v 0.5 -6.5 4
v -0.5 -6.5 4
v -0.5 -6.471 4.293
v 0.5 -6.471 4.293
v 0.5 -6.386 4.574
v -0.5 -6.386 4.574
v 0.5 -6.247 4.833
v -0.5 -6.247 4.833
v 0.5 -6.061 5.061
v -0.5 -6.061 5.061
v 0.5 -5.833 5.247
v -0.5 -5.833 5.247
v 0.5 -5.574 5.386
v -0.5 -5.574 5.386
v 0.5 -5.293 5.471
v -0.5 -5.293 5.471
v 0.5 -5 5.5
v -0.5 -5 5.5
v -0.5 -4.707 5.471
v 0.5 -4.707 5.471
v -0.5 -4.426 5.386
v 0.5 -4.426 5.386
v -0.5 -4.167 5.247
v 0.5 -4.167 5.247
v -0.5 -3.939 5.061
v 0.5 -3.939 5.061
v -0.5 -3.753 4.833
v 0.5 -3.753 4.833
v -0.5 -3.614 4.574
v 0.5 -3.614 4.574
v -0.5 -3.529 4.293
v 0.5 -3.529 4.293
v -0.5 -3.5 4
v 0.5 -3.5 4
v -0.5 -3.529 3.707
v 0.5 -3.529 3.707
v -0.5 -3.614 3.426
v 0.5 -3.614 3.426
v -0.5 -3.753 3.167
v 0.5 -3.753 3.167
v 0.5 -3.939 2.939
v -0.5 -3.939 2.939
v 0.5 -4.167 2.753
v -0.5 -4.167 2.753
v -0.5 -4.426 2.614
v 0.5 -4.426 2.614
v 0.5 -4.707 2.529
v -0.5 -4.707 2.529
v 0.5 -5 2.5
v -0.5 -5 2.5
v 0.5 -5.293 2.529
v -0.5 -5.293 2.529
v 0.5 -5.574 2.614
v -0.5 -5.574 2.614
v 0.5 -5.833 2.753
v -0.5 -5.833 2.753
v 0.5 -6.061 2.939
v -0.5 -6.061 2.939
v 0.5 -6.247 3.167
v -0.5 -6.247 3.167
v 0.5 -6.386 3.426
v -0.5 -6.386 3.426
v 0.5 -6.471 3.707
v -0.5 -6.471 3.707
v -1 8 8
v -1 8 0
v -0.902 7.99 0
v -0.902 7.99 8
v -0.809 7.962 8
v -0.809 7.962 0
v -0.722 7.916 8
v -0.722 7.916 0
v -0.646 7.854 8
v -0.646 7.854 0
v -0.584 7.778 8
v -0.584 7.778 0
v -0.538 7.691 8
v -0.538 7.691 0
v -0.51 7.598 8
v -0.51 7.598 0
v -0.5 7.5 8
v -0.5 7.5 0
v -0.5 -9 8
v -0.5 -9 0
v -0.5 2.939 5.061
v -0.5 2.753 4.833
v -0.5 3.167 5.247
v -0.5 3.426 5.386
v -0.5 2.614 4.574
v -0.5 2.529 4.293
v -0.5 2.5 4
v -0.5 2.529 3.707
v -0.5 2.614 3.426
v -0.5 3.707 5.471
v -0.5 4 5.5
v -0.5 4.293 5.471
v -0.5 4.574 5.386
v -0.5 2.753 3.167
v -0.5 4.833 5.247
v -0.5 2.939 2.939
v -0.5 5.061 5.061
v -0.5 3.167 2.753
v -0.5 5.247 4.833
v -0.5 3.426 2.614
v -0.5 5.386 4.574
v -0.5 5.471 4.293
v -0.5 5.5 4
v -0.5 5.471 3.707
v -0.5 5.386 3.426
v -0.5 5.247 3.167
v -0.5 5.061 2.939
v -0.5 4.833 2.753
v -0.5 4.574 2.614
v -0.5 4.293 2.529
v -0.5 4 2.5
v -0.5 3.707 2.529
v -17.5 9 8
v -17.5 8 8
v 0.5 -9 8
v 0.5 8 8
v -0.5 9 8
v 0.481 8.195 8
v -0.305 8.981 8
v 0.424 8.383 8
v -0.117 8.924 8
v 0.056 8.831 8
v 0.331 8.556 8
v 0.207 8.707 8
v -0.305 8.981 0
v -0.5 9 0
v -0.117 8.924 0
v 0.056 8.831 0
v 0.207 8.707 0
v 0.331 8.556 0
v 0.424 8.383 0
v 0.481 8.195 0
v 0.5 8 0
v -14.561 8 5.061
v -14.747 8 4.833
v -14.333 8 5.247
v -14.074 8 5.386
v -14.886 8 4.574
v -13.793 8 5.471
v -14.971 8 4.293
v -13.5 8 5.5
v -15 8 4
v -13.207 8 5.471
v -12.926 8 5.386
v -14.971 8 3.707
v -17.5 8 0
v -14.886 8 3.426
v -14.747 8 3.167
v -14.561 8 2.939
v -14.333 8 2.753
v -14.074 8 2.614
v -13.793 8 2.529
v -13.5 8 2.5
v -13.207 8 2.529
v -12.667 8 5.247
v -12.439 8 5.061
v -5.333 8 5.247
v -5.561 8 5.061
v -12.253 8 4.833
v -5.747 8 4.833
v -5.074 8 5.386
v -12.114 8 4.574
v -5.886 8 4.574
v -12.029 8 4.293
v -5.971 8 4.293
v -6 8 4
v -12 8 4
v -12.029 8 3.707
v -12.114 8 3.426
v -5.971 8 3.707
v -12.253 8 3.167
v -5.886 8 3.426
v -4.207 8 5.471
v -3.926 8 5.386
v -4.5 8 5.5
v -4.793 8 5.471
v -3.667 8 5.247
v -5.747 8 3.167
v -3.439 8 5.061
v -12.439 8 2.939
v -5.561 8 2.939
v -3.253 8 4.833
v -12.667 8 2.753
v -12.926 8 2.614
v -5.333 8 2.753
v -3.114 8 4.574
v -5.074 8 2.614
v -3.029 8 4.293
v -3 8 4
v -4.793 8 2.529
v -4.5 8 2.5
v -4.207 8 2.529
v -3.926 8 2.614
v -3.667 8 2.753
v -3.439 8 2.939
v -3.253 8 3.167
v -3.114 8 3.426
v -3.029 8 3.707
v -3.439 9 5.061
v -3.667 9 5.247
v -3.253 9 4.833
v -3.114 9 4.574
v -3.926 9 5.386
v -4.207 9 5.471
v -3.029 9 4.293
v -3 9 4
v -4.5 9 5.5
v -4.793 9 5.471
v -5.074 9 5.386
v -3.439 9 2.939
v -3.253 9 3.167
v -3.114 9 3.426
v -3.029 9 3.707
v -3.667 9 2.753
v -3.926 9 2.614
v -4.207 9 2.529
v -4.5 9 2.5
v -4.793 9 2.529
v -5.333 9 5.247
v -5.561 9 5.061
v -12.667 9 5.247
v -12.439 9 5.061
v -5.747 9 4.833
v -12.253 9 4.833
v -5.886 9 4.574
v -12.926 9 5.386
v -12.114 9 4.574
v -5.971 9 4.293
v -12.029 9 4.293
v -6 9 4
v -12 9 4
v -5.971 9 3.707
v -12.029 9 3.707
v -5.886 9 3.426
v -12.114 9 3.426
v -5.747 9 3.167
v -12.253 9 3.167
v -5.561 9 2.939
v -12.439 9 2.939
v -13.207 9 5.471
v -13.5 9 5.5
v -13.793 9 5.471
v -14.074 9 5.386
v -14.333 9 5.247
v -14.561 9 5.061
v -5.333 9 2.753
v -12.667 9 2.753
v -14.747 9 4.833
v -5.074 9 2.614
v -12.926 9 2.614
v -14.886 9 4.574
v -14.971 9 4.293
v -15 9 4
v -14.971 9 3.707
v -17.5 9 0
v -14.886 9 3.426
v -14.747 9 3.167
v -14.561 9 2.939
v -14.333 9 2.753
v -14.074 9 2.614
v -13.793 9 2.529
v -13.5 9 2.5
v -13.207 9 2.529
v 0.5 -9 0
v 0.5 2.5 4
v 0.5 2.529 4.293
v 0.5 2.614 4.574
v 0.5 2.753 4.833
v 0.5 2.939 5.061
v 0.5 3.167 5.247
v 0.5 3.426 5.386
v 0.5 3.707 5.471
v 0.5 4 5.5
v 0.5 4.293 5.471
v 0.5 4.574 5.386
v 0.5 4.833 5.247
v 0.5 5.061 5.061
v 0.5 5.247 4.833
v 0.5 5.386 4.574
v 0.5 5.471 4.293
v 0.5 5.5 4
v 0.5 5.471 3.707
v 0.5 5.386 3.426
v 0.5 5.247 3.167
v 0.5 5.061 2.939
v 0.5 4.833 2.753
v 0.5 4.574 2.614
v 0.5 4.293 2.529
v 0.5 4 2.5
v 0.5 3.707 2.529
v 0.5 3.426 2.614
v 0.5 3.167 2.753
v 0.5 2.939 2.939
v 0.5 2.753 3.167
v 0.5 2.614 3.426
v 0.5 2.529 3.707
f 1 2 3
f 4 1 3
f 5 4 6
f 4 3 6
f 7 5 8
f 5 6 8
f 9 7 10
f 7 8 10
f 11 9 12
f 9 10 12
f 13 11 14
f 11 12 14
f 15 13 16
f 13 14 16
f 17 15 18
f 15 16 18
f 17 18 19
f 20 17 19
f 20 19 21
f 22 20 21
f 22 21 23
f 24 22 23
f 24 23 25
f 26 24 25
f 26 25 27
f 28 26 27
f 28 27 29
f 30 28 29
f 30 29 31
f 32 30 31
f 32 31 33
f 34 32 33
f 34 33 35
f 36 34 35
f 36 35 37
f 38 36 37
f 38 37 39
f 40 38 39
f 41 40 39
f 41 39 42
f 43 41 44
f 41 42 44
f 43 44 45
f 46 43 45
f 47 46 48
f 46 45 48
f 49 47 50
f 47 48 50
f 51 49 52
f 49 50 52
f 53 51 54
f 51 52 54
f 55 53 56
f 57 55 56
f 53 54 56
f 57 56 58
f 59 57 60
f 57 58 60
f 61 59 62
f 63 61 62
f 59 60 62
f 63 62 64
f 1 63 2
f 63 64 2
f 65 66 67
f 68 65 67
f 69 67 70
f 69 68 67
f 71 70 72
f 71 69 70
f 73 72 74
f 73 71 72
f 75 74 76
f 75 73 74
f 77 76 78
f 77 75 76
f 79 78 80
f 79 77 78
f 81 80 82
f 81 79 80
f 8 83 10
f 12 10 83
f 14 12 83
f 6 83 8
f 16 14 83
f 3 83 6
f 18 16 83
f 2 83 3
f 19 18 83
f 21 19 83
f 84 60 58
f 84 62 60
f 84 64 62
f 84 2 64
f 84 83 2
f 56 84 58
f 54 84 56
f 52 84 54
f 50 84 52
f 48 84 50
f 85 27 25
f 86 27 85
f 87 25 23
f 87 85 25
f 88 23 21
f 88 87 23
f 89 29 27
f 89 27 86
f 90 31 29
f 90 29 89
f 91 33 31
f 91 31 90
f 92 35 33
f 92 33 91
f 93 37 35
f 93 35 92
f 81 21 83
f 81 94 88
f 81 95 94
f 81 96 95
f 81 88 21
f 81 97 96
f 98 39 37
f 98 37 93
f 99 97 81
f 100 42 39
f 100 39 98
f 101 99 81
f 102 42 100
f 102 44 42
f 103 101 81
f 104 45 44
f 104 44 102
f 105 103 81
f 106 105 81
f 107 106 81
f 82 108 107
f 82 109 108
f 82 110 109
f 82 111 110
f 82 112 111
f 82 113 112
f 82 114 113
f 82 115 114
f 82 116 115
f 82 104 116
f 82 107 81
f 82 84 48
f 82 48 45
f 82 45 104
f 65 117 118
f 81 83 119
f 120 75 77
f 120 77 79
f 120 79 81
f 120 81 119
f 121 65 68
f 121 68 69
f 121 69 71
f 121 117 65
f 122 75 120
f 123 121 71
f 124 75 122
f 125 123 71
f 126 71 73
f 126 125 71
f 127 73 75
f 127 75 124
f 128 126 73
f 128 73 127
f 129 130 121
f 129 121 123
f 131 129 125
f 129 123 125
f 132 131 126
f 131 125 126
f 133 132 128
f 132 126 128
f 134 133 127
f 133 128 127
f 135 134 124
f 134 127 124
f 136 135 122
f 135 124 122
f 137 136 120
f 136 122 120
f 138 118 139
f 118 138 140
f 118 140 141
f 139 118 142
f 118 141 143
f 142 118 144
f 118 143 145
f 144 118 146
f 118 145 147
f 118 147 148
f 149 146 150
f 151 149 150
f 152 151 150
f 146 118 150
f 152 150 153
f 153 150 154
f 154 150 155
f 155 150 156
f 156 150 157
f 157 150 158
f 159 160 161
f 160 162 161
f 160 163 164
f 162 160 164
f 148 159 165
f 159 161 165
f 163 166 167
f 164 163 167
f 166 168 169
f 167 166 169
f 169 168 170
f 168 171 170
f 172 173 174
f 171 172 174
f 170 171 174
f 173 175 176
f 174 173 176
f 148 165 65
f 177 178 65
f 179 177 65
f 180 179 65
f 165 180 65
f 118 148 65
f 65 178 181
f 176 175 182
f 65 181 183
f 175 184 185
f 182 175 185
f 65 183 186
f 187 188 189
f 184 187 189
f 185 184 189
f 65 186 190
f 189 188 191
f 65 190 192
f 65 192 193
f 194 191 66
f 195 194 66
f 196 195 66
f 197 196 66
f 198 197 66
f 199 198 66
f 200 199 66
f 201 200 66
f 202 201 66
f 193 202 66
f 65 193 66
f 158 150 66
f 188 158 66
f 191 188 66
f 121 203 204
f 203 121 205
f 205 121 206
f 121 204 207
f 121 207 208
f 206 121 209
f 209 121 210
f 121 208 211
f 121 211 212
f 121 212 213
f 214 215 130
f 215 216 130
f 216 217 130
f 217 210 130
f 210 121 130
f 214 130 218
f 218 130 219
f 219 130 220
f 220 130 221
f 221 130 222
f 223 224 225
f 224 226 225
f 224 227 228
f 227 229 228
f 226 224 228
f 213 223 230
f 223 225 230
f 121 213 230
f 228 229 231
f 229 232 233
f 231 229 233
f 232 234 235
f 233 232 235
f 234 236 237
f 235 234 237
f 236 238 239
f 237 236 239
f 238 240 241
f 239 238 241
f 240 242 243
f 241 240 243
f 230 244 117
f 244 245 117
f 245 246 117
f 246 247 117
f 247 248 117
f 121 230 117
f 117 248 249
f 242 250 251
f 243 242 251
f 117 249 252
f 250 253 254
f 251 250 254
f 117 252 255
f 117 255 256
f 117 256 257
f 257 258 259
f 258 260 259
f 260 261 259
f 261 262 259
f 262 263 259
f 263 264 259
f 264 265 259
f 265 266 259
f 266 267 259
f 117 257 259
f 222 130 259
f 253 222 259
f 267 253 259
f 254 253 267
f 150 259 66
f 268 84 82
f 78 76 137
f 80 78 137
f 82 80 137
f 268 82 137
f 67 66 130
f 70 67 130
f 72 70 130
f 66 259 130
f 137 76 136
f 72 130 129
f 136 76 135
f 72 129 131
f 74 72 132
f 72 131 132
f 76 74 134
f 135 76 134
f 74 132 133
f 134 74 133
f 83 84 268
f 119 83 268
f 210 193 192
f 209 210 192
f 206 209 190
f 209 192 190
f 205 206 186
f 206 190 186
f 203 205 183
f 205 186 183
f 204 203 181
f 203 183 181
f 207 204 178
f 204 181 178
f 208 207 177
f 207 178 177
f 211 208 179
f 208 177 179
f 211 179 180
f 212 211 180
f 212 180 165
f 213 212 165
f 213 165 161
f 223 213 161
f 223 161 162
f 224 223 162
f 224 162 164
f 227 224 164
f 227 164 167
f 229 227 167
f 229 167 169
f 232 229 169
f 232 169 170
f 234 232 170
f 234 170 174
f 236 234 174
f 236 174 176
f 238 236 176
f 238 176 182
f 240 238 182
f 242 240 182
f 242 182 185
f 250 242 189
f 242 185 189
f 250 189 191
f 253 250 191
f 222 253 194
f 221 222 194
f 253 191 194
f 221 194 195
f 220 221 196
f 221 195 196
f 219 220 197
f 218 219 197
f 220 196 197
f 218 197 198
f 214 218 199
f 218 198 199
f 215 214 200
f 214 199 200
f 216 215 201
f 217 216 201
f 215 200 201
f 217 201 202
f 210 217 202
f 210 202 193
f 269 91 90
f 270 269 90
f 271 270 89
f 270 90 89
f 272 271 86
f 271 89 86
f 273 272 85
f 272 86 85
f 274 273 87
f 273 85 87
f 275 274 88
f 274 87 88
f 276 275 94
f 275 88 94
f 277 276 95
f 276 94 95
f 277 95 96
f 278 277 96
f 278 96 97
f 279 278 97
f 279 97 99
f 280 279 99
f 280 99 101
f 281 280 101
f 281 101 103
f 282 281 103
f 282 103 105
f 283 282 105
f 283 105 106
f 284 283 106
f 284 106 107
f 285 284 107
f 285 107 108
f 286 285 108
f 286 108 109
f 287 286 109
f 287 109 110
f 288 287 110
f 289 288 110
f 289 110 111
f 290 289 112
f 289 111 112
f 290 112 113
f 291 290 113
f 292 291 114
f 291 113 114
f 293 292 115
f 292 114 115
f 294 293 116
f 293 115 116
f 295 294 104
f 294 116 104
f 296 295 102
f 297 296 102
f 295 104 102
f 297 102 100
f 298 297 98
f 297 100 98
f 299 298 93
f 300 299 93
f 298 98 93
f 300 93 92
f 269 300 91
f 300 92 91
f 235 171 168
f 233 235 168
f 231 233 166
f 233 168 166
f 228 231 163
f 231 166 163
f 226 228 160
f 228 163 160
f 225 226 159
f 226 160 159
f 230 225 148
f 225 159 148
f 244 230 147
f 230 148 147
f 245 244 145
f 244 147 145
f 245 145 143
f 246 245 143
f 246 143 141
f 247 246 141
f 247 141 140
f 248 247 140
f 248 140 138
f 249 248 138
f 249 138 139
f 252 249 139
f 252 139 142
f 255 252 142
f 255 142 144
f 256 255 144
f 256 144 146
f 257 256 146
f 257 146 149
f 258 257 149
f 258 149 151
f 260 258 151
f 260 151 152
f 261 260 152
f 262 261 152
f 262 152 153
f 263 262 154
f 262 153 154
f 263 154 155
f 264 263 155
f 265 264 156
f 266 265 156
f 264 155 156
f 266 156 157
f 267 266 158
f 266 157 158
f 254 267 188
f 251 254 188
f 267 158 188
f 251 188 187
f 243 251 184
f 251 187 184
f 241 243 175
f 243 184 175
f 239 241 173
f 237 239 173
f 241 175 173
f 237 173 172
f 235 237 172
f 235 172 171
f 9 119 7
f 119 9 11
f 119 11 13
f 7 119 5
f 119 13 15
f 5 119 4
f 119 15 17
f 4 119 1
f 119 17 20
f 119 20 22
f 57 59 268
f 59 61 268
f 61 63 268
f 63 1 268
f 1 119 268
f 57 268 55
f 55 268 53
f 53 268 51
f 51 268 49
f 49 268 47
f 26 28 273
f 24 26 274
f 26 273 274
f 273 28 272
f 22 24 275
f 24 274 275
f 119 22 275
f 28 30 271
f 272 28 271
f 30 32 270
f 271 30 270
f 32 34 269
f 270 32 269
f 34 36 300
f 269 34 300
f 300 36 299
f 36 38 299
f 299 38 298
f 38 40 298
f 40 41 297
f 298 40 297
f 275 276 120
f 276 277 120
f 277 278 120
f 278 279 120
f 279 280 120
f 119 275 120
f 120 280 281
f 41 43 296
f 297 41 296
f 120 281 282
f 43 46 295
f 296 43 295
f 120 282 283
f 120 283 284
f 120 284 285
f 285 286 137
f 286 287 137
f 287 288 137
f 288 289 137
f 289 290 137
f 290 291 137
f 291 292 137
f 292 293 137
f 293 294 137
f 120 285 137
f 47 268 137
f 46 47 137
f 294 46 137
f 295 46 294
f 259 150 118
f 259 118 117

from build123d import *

# Parameters (mm, degrees)
F0_W     = 1
F0_H     = 1
F0_W_2   = 17
F0_H_2   = 17
F1_DEPTH = 8
F3_R     = 1.5
F4_DEPTH = 25
F2_R     = 1.5
F5_DEPTH = 25
F6_R     = 1
F7_R     = 0.5


with BuildPart() as f1:
    # F0 (on Top) → F1 (new body)
    with BuildSketch(Plane.XY):
        with Locations((0, 8.5)):
            Rectangle(F0_W, F0_H)
        with Locations((-9, 8.5)):
            Rectangle(F0_W_2, F0_H)
        with Locations((0, -0.5)):
            Rectangle(F0_W, F0_H_2)
    extrude(amount=F1_DEPTH)

    # F3 (on face) → F4 (cut)
    with BuildSketch(Plane.XZ.offset(-8)):
        with BuildLine():
            ThreePointArc((-15, 4), (-13.5, 2.5), (-12, 4))
            ThreePointArc((-12, 4), (-13.5, 5.5), (-15, 4))
        make_face()
        with Locations((-4.5, 4)):
            Circle(F3_R)
    extrude(amount=-F4_DEPTH, mode=Mode.SUBTRACT)

    # F2 (on face) → F5 (cut)
    with BuildSketch(Plane(origin=(-0.5, 0, 0), x_dir=(0, -1, 0), z_dir=(-1, 0, 0))):
        with Locations((5, 4)):
            Circle(F2_R)
        with Locations((-4, 4)):
            Circle(F2_R)
    extrude(amount=-F5_DEPTH, mode=Mode.SUBTRACT)

    # F6
    f6_edges = [f1.edges().sort_by_distance(p)[0] for p in [
        (0.5, 9, 4),
    ]]
    fillet(f6_edges, radius=F6_R)

    # F7
    f7_edges = [f1.edges().sort_by_distance(p)[0] for p in [
        (-0.5, 8, 4),
    ]]
    fillet(f7_edges, radius=F7_R)


solid = f1.part
